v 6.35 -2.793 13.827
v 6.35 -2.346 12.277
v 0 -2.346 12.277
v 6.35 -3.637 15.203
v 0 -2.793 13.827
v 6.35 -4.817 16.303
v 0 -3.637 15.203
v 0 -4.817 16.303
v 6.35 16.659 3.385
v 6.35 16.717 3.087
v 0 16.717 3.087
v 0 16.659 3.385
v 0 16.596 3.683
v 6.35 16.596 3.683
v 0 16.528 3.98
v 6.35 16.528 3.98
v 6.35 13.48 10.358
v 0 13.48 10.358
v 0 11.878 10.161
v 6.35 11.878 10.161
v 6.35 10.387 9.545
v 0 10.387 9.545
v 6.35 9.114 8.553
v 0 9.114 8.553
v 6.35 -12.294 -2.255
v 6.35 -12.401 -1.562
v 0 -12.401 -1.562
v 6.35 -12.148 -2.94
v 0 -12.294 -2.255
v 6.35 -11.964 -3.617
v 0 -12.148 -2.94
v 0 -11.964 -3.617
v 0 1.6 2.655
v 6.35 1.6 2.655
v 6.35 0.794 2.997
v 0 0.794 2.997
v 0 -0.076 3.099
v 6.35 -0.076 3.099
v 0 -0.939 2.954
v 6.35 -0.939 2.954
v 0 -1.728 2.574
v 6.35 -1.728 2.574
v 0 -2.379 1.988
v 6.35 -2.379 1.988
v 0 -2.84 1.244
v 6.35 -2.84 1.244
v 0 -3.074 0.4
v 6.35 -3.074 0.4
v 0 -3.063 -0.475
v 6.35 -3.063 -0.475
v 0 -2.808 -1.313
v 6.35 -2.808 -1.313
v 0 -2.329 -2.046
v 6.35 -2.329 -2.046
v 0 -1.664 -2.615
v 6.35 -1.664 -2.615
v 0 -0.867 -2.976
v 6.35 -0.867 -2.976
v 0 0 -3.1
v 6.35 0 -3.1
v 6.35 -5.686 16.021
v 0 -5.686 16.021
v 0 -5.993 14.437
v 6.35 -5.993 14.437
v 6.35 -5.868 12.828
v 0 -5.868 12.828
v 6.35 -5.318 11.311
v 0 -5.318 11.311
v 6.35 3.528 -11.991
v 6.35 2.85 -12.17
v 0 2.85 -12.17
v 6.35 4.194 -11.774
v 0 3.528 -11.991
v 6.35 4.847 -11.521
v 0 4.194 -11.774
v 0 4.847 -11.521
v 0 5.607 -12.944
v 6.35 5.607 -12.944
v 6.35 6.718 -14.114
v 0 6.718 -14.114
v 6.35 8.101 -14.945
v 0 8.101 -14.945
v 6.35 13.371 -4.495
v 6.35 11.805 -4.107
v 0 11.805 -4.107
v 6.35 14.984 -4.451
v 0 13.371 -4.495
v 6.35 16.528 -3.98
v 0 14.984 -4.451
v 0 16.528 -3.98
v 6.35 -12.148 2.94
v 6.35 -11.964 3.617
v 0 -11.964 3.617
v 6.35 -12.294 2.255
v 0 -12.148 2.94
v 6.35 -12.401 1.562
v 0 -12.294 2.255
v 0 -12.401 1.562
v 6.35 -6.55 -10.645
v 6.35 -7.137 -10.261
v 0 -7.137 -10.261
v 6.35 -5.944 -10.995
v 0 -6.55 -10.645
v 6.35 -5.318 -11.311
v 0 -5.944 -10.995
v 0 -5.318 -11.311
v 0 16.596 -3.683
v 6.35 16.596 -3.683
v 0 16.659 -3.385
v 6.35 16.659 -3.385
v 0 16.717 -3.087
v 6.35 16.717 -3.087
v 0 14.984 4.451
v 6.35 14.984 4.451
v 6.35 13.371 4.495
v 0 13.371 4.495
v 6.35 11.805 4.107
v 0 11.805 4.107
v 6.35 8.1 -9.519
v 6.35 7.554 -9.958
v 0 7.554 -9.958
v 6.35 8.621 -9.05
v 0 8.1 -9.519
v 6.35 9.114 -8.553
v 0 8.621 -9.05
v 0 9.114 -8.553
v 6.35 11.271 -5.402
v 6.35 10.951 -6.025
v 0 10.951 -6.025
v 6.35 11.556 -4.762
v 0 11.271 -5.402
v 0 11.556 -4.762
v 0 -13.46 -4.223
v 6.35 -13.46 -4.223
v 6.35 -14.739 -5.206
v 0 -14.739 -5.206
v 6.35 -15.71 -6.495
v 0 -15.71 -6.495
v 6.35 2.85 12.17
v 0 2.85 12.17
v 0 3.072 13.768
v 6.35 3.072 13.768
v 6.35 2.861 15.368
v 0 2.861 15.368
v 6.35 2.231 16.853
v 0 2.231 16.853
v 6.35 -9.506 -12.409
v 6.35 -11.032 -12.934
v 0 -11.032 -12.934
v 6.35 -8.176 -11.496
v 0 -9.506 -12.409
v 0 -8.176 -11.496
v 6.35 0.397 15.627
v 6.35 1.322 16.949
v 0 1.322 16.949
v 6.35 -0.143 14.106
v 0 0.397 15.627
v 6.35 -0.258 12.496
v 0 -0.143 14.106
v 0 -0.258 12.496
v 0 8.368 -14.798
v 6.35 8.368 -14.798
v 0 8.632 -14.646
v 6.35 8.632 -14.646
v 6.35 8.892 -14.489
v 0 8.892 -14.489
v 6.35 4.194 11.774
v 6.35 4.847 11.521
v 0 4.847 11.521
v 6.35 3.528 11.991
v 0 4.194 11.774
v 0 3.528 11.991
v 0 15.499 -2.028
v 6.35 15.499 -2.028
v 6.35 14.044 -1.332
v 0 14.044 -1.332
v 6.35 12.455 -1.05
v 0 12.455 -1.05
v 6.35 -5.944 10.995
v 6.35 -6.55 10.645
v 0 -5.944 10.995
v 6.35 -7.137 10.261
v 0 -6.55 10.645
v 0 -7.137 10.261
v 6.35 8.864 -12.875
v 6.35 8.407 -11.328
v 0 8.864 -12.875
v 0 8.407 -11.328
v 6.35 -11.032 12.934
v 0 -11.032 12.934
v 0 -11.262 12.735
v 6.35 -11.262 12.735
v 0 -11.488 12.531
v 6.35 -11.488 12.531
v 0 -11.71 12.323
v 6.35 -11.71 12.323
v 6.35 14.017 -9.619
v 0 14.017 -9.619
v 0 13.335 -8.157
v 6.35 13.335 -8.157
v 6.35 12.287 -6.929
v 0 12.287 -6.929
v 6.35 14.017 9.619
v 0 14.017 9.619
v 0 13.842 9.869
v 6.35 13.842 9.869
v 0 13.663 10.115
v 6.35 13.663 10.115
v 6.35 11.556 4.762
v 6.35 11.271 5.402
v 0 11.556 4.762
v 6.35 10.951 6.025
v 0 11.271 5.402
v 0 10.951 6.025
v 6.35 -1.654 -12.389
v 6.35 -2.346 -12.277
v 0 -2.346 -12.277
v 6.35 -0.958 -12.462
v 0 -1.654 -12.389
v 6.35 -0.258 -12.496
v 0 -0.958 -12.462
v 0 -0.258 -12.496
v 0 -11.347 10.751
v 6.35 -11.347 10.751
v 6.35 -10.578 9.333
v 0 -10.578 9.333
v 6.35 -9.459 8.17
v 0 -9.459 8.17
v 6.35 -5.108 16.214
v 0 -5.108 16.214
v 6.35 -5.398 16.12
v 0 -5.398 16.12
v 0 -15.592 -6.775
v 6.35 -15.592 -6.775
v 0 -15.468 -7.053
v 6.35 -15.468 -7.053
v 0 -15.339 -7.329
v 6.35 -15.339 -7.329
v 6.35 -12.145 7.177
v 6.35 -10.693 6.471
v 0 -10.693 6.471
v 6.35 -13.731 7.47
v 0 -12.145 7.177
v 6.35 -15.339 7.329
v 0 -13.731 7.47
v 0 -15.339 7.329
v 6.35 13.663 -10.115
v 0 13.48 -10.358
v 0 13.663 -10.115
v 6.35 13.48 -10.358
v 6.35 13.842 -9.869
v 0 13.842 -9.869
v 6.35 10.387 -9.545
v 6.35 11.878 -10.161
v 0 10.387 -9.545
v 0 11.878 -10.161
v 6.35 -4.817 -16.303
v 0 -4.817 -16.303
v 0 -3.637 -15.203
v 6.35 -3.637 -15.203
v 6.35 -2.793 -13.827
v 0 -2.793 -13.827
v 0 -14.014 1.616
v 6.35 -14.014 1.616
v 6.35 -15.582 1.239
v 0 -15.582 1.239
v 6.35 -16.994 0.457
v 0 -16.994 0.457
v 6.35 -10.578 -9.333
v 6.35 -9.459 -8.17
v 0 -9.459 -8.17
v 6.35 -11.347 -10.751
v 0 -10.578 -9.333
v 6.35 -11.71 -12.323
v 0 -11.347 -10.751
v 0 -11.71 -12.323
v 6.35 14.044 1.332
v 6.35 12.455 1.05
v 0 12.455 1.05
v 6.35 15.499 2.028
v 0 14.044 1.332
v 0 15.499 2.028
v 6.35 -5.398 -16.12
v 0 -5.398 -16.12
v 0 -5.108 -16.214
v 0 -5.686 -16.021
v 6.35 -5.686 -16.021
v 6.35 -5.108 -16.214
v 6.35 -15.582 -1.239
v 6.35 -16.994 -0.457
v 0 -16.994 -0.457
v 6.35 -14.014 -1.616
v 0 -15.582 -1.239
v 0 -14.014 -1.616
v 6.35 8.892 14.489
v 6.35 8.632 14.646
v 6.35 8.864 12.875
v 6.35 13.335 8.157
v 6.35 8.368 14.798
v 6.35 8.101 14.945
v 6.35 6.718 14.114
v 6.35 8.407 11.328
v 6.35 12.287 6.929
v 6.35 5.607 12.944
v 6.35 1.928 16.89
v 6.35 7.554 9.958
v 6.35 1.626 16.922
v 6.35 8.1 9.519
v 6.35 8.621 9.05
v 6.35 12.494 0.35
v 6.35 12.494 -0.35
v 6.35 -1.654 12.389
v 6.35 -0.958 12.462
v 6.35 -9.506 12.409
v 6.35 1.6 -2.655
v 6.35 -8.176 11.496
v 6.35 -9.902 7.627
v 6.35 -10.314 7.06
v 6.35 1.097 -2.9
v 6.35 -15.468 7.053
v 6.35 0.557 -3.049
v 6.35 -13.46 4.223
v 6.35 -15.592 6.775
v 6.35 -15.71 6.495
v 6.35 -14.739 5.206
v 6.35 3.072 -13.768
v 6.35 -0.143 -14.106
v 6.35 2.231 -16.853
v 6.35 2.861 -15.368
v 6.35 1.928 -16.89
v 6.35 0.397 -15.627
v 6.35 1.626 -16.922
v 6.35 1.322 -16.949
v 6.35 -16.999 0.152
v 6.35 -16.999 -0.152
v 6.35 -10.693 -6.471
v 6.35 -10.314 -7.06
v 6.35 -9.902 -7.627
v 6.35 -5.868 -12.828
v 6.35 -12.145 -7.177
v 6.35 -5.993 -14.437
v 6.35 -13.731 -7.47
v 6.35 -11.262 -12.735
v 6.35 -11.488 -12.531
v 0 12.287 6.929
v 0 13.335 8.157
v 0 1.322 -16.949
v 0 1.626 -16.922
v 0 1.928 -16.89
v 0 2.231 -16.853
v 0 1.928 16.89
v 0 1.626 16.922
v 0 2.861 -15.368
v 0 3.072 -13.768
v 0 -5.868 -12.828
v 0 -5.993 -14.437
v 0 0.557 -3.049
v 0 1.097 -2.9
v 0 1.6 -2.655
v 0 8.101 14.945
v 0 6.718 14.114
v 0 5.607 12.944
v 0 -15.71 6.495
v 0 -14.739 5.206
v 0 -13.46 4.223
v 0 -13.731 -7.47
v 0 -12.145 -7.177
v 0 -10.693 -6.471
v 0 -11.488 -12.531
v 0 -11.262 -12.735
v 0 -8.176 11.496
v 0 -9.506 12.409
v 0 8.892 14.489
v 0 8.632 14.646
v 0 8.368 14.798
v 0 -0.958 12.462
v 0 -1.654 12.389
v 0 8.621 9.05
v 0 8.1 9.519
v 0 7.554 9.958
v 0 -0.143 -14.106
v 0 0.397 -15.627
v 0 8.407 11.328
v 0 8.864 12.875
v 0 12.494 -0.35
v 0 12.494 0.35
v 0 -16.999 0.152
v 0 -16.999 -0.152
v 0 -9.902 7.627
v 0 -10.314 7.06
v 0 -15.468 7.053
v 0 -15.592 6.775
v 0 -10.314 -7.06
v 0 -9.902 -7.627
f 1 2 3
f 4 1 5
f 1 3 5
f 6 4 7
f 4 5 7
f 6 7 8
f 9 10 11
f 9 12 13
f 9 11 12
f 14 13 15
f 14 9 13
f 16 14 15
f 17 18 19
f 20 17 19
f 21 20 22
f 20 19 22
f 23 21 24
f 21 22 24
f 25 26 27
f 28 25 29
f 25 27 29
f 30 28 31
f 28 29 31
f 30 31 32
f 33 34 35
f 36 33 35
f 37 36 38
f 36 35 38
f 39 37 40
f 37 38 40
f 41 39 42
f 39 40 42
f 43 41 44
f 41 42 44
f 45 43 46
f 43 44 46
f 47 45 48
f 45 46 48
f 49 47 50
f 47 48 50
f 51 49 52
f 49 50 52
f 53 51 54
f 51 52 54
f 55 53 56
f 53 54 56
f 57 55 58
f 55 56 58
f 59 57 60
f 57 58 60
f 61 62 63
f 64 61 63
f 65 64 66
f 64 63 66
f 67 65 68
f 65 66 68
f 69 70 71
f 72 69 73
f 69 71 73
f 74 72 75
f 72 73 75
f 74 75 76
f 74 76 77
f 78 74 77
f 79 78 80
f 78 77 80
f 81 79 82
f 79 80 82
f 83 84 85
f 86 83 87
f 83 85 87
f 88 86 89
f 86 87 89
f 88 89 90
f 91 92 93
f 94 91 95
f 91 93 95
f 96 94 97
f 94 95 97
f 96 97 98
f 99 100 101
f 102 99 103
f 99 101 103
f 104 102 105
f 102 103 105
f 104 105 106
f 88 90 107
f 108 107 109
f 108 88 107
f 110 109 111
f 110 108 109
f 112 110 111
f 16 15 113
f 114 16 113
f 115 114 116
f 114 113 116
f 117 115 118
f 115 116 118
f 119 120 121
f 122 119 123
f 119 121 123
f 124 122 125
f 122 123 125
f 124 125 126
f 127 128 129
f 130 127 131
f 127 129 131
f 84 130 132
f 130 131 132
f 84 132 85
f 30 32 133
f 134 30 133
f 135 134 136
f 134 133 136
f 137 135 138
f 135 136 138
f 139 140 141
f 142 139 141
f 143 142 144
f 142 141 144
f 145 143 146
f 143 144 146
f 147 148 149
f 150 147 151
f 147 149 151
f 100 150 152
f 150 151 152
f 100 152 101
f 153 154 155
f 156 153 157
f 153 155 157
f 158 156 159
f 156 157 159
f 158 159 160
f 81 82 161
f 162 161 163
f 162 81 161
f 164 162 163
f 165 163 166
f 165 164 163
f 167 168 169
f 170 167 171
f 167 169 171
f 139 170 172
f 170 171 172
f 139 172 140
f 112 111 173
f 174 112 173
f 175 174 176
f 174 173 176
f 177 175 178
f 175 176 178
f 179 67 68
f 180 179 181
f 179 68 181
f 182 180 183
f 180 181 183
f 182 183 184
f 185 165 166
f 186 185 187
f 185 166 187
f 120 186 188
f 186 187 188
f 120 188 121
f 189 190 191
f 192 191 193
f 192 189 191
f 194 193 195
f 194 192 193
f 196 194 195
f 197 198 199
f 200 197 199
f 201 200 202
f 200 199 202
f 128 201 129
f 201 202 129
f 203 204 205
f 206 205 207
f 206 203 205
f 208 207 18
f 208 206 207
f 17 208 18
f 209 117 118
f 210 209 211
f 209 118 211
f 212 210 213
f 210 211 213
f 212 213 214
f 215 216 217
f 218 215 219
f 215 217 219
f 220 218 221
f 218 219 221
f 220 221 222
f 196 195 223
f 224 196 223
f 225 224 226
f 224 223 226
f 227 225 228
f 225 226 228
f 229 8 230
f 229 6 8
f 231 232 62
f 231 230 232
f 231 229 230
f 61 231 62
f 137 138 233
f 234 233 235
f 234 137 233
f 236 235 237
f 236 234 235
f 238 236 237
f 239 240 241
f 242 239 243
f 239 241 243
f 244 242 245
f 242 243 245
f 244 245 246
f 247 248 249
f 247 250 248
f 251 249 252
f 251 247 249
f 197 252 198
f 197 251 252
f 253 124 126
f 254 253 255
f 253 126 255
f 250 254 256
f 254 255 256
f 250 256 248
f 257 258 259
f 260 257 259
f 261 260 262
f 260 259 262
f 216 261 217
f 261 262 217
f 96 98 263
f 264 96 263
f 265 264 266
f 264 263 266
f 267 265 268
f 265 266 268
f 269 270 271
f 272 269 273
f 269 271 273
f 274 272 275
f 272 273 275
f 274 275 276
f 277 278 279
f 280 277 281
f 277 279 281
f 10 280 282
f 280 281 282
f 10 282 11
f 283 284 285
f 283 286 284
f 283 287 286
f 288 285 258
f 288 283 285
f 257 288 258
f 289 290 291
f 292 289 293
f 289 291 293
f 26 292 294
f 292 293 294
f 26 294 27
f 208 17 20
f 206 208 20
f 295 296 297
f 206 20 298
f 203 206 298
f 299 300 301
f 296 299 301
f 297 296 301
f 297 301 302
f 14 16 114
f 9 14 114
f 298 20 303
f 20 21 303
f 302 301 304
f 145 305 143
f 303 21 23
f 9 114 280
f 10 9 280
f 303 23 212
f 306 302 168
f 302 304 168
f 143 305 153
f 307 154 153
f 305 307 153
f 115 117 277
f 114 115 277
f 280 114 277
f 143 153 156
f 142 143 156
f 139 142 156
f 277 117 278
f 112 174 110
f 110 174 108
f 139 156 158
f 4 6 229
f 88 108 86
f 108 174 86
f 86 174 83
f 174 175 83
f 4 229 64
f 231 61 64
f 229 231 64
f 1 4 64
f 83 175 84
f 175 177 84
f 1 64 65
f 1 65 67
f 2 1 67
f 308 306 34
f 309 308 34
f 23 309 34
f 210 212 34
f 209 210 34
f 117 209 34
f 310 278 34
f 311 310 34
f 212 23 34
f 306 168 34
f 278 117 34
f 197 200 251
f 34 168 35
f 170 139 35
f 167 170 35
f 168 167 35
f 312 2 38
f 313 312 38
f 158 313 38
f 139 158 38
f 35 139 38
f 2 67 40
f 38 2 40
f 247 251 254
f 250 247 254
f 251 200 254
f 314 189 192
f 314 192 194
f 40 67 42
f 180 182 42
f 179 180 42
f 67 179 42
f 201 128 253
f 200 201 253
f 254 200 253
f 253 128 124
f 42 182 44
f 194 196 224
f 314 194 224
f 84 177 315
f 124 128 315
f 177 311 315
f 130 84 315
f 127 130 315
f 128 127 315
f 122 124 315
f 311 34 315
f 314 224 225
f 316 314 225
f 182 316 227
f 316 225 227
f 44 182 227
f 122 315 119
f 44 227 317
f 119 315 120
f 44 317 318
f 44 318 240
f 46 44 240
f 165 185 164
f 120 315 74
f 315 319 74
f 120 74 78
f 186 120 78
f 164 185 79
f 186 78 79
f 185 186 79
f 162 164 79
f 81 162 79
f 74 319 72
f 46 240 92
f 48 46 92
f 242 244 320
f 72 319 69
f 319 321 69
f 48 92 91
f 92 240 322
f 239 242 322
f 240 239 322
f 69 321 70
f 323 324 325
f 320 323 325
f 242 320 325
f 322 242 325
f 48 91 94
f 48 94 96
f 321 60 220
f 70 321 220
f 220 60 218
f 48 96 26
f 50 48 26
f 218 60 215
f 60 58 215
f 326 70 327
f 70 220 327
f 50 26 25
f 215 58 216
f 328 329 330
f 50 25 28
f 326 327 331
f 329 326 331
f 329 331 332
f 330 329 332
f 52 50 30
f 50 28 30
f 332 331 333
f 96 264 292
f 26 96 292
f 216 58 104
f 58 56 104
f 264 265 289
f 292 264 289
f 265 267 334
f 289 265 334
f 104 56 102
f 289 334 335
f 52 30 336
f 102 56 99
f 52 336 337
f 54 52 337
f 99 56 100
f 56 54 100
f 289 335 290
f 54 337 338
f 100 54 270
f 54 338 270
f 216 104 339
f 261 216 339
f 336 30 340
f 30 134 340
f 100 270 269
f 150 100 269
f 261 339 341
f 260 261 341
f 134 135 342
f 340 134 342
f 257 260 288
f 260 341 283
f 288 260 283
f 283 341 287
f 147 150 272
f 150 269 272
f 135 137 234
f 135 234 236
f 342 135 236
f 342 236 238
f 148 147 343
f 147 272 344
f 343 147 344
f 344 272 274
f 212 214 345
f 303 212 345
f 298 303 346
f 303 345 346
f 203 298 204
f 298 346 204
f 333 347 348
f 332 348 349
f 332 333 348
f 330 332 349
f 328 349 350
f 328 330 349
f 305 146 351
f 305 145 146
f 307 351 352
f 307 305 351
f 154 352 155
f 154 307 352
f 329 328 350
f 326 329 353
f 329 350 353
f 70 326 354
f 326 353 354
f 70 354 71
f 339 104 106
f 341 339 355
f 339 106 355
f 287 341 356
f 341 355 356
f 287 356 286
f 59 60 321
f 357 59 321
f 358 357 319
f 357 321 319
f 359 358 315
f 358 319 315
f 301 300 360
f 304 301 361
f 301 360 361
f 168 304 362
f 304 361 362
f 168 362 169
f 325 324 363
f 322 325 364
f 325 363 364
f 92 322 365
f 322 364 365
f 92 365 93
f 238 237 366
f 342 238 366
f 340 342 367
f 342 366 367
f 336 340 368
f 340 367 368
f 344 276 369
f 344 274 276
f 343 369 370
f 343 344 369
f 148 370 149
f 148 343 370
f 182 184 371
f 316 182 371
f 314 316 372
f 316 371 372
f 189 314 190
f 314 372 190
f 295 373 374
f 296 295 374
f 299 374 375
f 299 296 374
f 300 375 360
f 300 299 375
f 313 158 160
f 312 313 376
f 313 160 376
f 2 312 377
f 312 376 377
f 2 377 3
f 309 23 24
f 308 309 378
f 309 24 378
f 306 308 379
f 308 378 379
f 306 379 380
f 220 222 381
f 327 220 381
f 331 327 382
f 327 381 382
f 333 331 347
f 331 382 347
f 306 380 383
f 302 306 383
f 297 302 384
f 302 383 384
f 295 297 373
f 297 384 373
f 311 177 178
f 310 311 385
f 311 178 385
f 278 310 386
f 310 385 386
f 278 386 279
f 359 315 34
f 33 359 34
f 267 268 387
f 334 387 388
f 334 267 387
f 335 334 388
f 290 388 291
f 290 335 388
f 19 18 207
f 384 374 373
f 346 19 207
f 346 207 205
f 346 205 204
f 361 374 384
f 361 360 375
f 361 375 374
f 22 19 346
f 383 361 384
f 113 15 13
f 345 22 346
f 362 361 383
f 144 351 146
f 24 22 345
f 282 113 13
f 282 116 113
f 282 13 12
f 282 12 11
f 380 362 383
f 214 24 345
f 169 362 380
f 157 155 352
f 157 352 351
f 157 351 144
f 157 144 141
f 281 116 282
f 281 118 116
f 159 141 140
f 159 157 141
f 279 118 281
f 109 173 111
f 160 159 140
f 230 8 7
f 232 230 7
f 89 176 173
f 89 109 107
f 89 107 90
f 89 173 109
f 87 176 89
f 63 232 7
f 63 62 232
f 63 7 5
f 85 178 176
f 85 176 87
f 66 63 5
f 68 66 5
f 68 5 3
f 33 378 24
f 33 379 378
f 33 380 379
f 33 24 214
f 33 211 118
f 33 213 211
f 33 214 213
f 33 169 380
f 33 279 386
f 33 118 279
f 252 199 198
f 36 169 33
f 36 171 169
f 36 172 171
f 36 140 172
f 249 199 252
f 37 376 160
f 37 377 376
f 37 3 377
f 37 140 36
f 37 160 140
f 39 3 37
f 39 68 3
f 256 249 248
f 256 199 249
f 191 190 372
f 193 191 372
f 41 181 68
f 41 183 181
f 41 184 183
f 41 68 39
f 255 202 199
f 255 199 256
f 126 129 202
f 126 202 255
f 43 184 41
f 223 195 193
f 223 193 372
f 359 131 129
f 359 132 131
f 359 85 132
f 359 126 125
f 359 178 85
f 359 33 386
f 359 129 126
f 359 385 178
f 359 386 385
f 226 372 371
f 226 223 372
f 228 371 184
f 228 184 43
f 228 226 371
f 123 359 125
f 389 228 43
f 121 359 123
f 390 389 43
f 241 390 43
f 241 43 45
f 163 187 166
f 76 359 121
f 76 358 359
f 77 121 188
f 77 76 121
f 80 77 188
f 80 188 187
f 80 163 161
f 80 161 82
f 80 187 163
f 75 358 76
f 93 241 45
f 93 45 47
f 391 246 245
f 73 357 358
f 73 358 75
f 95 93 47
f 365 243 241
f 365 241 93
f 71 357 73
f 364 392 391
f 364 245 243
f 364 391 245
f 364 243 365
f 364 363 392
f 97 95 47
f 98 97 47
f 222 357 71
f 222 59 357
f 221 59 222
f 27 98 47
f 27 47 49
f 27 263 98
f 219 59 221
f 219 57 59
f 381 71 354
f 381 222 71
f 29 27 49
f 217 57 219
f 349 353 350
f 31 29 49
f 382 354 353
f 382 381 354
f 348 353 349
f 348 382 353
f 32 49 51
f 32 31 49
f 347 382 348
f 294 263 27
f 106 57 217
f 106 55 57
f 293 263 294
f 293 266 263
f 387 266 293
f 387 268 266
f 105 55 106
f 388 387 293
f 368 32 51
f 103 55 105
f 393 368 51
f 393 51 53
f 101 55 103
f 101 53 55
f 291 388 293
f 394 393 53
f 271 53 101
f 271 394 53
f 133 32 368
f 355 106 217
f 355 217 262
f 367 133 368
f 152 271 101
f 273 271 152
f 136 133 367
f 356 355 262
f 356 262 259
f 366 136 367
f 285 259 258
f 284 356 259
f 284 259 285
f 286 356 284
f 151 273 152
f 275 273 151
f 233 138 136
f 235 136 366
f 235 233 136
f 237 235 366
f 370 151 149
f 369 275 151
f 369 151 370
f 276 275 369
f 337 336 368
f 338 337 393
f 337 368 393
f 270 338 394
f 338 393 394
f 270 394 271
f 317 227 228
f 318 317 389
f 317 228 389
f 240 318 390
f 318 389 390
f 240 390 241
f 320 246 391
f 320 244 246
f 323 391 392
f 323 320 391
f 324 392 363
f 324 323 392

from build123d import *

# Parameters (mm, degrees)
BASPROSKE_W        = 6.35
BASPROSKE_H        = 17
TOOTHCUT_DEPTH     = 25.86609137
TEETHCUTS_COUNT    = 15
TEETHCUTS_ANGLE    = 336
BORSKE_R           = 0.4
BORE_DEPTH         = 50.0000508
CUT_EXTRUDE1_DEPTH = 10


with BuildPart() as part:
    # BasProSke → Base-Revolve (revolve)
    with BuildSketch(Plane(origin=(0, 0, 0), x_dir=(1, 0, 0), z_dir=(0, 1, 0)), mode=Mode.PRIVATE) as base_revolve_sk:
        with Locations((3.175, 8.5)):
            Rectangle(BASPROSKE_W, BASPROSKE_H)
    revolve(base_revolve_sk.sketch.rotate(Axis((-10, 0, 0), (1, 0, 0)), 180), axis=Axis((-10, 0, 0), (1, 0, 0)))

    # TooCutSke → ToothCut (cut, through all)
    with BuildSketch(Plane(origin=(0, 0, 0), x_dir=(0, 0, -1), z_dir=(1, 0, 0))):
        with BuildLine():
            ThreePointArc((1.050056448, 12.454813626), (0, 12.499), (-1.050056448, 12.454813626))
            ThreePointArc((-1.050056448, 12.454813626), (-1.638118106, 14.809604533), (-3.110934279, 16.73876737))
            ThreePointArc((-3.110934279, 16.73876737), (0, 17.0254), (3.110934279, 16.73876737))
            ThreePointArc((3.110934279, 16.73876737), (1.638118106, 14.809604533), (1.050056448, 12.454813626))
        make_face()
    toothcut = extrude(amount=TOOTHCUT_DEPTH, mode=Mode.SUBTRACT)

    # TeethCuts: ToothCut ×15 about axis
    teethcuts_axis = Axis((-10, 0, 0), (1, 0, 0))
    for i in range(1, TEETHCUTS_COUNT):
        add(toothcut.rotate(teethcuts_axis, i * TEETHCUTS_ANGLE / (TEETHCUTS_COUNT - 1)), mode=Mode.SUBTRACT)

    # BorSke → Bore (cut, symmetric)
    with BuildSketch(Plane(origin=(0, 0, 0), x_dir=(0, 0, -1), z_dir=(1, 0, 0))):
        with Locations(Location((0, 0, 0), (0, 0, 180))):
            Circle(BORSKE_R)
    extrude(amount=BORE_DEPTH, both=True, mode=Mode.SUBTRACT)

    # Sketch1 → Cut-Extrude1 (cut)
    with BuildSketch(Plane(origin=(6.35, 0, 0), x_dir=(0, 0, -1), z_dir=(1, 0, 0))):
        with BuildLine():
            Line((2.655183609, 1.6), (-2.655183609, 1.6))
            ThreePointArc((-2.655183609, 1.6), (-0.830340536, -2.986726401), (3.1, 0))
            ThreePointArc((3.1, 0), (2.986726401, 0.830340536), (2.655183609, 1.6))
        make_face()
    extrude(amount=-CUT_EXTRUDE1_DEPTH, mode=Mode.SUBTRACT)


solid = part.part
